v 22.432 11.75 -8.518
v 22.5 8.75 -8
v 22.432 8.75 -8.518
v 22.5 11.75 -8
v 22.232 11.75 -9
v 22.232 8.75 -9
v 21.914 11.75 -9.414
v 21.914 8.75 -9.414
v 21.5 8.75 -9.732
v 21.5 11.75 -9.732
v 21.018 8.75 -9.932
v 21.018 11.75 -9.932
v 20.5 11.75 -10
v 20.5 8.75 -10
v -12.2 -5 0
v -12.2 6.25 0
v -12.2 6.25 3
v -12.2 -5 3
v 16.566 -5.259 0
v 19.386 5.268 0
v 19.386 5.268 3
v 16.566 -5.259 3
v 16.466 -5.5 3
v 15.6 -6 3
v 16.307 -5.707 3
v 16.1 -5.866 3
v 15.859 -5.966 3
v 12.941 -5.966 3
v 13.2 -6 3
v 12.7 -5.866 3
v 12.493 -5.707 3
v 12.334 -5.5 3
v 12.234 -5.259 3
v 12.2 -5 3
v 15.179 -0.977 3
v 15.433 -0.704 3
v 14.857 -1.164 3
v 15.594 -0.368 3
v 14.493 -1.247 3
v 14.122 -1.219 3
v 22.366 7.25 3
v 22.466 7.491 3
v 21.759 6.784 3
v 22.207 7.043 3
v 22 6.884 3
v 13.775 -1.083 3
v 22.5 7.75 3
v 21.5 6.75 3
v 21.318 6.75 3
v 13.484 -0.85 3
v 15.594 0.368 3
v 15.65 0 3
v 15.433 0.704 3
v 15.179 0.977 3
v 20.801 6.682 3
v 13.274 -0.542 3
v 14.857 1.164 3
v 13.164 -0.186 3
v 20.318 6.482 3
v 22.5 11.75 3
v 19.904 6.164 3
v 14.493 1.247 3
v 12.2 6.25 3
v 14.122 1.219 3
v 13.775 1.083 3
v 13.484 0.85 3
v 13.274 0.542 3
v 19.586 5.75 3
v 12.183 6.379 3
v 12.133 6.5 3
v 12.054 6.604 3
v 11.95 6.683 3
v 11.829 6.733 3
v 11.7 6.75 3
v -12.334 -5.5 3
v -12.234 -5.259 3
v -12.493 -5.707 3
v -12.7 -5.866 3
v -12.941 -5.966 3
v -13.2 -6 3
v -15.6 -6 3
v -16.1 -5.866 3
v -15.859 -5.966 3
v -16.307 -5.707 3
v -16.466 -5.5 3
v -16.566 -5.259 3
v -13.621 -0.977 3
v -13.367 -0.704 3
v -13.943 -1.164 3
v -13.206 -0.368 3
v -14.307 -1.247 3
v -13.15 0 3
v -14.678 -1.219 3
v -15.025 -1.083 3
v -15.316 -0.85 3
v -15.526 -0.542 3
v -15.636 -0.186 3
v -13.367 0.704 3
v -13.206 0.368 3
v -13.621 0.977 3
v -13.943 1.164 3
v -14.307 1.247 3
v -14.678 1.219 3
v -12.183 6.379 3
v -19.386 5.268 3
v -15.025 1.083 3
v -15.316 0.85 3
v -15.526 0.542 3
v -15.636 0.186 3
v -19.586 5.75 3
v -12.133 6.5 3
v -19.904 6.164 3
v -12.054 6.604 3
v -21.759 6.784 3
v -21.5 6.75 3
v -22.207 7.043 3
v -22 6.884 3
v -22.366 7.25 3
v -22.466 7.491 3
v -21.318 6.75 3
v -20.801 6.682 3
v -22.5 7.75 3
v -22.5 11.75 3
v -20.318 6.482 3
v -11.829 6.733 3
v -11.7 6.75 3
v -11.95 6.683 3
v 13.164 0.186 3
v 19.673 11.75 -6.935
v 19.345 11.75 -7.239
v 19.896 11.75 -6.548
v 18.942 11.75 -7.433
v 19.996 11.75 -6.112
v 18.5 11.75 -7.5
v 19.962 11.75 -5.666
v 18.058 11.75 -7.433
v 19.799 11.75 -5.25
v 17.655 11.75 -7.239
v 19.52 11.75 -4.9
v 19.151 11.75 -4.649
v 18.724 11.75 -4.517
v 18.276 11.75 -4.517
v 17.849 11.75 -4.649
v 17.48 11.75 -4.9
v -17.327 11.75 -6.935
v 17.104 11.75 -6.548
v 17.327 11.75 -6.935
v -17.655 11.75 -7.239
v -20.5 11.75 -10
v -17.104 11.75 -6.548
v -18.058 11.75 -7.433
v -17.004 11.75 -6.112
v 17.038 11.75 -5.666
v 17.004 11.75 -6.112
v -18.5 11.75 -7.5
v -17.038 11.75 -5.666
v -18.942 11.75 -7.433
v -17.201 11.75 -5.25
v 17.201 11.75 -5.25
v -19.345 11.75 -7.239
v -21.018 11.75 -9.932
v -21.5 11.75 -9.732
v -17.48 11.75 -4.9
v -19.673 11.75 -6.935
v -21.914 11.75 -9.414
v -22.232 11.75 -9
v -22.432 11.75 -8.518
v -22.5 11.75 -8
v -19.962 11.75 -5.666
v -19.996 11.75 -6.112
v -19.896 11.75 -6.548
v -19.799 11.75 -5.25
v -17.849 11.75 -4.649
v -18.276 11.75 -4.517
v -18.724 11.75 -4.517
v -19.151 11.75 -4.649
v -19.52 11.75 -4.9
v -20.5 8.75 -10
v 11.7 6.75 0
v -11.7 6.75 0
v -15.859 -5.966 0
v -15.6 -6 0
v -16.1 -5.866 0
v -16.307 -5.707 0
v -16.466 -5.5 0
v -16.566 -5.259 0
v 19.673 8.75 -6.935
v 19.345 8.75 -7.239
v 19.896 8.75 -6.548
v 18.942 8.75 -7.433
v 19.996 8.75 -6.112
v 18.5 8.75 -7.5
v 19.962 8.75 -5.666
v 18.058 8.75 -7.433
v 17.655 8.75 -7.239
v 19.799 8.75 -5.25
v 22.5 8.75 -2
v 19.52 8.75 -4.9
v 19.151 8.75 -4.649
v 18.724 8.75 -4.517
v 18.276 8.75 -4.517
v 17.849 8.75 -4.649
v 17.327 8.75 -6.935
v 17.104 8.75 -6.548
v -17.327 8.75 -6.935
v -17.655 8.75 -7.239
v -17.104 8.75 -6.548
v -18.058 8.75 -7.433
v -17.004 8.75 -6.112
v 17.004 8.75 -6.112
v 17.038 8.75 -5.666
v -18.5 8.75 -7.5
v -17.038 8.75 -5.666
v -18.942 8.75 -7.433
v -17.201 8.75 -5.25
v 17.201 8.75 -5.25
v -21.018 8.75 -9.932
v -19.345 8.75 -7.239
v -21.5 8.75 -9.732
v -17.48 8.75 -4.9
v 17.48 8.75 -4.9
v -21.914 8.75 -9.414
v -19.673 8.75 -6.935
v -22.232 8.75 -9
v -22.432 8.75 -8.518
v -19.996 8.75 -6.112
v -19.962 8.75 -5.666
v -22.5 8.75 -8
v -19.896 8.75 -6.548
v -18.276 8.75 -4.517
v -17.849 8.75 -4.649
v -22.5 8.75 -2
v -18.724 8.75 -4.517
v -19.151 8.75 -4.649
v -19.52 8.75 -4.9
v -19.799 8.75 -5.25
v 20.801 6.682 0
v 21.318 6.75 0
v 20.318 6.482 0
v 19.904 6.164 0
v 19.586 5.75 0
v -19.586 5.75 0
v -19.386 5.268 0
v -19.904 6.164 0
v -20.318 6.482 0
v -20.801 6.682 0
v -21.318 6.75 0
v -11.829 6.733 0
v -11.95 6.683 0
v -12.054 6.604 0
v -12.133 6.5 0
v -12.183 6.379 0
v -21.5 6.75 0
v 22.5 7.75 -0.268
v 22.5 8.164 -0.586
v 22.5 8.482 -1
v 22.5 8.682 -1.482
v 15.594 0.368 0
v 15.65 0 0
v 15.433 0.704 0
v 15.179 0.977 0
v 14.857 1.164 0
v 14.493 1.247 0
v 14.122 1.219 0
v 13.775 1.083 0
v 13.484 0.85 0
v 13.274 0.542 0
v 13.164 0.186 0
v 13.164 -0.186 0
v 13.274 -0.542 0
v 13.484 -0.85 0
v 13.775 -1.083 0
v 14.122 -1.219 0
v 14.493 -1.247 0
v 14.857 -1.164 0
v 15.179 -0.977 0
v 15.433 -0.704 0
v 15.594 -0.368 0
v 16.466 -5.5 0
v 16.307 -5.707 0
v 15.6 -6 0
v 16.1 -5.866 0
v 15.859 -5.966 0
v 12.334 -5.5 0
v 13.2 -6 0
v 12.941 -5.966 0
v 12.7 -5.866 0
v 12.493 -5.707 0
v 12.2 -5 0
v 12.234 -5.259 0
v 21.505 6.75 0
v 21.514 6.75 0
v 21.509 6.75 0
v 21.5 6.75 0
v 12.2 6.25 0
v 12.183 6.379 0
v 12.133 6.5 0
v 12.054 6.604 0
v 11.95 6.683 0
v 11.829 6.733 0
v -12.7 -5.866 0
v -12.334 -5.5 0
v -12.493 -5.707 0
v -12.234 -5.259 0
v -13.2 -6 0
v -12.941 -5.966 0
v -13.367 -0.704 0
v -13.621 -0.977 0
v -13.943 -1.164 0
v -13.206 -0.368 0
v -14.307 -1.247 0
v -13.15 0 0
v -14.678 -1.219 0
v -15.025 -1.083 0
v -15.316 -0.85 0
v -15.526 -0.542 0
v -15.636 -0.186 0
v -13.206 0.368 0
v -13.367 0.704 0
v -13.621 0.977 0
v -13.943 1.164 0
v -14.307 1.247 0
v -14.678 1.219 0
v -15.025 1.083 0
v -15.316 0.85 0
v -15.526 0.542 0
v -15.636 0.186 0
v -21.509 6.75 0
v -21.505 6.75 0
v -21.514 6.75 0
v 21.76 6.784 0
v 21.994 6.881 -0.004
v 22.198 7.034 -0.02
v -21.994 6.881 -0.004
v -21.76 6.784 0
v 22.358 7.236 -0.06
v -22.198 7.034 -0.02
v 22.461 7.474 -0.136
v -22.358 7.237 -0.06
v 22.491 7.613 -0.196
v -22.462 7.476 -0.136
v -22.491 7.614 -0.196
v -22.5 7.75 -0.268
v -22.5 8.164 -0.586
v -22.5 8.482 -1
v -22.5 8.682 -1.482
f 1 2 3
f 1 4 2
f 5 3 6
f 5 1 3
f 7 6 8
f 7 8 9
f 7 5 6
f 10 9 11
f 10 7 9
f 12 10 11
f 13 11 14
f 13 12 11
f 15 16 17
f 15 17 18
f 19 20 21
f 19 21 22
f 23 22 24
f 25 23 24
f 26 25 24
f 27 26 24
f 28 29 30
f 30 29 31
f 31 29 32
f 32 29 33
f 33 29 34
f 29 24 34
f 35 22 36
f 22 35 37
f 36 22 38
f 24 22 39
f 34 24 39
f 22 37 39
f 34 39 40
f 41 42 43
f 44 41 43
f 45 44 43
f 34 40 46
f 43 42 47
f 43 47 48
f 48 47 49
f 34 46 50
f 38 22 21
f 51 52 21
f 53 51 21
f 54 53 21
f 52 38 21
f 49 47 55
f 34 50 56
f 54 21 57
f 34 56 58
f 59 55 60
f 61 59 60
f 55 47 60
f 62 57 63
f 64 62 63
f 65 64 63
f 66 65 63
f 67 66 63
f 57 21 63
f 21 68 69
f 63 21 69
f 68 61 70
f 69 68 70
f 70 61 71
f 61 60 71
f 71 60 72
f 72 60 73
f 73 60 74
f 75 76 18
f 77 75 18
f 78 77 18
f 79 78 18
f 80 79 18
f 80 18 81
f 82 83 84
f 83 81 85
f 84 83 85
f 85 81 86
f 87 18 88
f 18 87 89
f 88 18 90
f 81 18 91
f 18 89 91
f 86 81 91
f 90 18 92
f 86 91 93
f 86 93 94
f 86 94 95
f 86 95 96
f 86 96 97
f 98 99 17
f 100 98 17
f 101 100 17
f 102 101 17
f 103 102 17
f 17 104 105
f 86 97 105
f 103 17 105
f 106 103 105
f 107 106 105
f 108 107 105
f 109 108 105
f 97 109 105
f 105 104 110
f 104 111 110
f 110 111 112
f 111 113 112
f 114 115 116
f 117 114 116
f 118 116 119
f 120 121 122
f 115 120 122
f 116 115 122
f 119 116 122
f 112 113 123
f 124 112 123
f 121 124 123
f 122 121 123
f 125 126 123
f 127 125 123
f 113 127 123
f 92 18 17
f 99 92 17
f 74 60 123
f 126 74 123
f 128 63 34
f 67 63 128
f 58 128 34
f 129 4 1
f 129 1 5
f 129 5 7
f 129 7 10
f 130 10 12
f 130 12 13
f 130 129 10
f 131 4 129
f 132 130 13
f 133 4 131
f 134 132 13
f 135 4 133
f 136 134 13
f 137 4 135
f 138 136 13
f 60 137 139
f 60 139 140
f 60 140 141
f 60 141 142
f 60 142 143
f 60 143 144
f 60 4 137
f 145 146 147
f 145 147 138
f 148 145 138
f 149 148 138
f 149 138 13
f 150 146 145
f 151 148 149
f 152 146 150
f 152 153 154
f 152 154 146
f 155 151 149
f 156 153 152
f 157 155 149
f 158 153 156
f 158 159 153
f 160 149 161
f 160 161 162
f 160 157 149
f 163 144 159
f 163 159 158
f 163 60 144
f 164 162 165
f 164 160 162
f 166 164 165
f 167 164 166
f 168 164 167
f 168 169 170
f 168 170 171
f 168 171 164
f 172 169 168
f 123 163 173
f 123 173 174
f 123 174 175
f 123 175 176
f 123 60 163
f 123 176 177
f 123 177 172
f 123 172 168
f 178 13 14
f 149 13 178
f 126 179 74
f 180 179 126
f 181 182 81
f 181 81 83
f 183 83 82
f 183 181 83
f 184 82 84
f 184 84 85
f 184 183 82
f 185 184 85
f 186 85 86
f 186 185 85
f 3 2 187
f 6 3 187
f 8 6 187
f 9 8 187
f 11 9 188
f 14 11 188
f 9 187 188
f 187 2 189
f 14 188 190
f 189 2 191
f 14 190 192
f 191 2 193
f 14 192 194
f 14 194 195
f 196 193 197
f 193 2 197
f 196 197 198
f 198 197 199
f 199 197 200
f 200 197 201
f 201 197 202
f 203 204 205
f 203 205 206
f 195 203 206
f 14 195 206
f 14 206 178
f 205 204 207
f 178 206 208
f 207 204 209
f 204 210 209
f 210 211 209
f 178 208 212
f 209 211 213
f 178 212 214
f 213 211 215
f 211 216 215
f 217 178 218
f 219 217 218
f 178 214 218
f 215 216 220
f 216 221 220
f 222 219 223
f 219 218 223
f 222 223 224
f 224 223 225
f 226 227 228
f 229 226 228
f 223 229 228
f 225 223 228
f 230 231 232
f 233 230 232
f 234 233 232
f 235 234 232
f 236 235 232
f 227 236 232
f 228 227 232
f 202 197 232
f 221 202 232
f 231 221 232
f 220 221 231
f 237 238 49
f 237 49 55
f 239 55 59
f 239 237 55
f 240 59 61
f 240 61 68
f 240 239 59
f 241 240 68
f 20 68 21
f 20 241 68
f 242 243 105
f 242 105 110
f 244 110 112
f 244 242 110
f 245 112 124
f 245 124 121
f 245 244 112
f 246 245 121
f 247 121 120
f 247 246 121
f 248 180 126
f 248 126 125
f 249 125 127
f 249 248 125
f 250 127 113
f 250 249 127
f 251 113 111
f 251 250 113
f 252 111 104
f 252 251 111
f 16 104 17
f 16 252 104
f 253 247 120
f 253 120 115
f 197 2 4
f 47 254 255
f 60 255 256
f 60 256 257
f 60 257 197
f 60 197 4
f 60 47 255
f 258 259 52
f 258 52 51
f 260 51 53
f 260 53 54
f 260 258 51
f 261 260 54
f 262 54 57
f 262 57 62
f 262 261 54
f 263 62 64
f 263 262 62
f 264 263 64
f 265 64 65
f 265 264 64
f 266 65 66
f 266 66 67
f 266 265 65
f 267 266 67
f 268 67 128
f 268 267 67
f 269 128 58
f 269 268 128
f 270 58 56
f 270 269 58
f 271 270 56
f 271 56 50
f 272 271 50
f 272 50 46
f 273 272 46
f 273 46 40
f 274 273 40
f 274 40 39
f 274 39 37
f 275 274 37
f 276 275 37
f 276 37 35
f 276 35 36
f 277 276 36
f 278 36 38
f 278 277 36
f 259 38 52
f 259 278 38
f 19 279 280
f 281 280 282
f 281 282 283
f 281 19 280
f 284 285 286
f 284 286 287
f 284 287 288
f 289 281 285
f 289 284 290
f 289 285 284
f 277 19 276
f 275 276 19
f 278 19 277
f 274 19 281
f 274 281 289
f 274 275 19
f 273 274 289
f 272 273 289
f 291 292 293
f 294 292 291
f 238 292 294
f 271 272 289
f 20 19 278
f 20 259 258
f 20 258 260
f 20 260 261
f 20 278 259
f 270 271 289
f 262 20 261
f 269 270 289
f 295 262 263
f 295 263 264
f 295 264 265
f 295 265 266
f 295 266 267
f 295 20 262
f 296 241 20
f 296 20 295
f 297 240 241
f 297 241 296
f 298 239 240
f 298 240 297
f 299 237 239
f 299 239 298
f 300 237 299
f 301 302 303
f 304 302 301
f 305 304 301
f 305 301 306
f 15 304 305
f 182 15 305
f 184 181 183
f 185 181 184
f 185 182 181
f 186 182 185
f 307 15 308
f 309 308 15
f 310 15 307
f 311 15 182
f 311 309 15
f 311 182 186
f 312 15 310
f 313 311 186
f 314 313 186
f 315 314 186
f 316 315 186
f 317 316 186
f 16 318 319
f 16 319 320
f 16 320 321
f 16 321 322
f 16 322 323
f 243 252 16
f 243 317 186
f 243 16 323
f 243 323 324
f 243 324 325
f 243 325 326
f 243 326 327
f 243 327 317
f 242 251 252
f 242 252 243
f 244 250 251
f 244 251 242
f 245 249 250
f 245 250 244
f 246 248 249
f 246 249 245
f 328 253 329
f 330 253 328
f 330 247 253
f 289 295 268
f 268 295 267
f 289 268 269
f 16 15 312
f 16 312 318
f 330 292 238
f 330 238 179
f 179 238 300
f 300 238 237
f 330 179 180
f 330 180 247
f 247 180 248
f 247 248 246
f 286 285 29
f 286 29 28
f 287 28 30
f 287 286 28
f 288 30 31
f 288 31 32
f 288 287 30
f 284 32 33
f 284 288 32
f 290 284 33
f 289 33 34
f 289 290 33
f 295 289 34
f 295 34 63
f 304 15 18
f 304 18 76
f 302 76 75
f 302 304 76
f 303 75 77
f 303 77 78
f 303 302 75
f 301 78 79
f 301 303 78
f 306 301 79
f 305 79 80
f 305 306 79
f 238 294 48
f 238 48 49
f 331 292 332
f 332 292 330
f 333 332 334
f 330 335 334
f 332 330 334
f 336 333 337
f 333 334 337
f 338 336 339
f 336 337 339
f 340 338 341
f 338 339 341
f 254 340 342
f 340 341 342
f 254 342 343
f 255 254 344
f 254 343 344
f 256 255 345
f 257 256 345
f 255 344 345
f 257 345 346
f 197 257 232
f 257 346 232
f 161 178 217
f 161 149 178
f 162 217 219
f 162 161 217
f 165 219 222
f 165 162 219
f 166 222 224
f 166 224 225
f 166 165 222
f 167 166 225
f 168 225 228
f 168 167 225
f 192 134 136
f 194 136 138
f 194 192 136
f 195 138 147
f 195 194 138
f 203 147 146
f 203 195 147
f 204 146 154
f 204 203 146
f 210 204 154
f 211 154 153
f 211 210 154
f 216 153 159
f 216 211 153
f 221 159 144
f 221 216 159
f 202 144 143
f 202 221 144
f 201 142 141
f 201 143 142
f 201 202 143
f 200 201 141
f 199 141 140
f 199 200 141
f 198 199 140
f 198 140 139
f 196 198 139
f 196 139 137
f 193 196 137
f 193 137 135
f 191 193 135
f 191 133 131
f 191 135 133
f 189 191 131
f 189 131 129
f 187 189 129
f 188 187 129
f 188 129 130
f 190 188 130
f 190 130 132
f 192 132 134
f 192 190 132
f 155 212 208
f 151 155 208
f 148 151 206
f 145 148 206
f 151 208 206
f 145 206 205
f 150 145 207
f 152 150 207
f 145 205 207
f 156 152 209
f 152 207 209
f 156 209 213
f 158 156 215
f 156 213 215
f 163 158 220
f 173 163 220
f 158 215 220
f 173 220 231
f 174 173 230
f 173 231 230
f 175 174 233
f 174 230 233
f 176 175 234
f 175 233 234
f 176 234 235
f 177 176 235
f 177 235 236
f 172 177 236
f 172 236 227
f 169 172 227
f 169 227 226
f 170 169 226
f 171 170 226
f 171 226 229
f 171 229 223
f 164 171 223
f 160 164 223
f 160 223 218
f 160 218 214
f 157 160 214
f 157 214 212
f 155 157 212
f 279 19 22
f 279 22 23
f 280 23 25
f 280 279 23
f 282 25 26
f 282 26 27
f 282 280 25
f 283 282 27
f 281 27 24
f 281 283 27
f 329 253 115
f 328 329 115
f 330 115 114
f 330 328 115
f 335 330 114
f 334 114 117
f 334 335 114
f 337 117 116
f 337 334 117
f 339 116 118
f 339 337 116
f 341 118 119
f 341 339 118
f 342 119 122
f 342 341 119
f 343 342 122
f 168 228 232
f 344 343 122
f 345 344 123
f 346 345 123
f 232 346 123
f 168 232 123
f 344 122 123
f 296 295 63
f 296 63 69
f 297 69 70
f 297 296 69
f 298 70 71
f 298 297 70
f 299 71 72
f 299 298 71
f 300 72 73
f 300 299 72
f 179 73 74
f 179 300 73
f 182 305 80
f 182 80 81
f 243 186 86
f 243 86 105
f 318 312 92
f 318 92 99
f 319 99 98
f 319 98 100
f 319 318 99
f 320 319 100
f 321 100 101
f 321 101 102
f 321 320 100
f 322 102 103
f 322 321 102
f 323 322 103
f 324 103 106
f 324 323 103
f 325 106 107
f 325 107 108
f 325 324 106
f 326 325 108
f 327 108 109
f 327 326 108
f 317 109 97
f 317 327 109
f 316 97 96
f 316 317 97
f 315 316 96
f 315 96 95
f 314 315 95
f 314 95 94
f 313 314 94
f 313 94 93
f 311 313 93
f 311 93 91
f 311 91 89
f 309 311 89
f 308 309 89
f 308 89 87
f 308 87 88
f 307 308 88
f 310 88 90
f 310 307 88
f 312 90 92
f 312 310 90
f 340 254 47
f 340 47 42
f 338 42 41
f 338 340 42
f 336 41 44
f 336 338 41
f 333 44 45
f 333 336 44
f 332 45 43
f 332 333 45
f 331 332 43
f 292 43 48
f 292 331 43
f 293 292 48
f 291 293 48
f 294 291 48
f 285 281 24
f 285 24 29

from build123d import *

# Parameters (mm, degrees)
SKETCH3_R           = 1.25
BOSS_EXTRUDE1_DEPTH = 3
SKETCH4_W           = 45
SKETCH4_H           = 3
BOSS_EXTRUDE2_DEPTH = 10
FILLET1_R           = 2
FILLET2_R           = 2
SKETCH5_R           = 1.5
CUT_EXTRUDE1_DEPTH  = 29.702134145


with BuildPart() as part:
    # Sketch3 → Boss-Extrude1 (new body)
    with BuildSketch(Plane.XY):
        with BuildLine():
            Line((-12.2, 6.25), (-12.2, -5))
            ThreePointArc((-12.2, -5), (-12.492893219, -5.707106781), (-13.2, -6))
            Line((-13.2, -6), (-15.6, -6))
            ThreePointArc((-15.6, -6), (-16.208761429, -5.79335334), (-16.565925826, -5.258819045))
            Line((-16.565925826, -5.258819045), (-19.386481515, 5.26763809))
            ThreePointArc((-19.386481515, 5.26763809), (-20.100810309, 6.336706681), (-21.318333167, 6.75))
            Line((-21.318333167, 6.75), (-21.5, 6.75))
            ThreePointArc((-21.5, 6.75), (-22.207106781, 7.042893219), (-22.5, 7.75))
            Line((-22.5, 7.75), (-22.5, 11.75))
            Line((-22.5, 11.75), (22.5, 11.75))
            Line((22.5, 11.75), (22.5, 7.75))
            ThreePointArc((22.5, 7.75), (22.207106781, 7.042893219), (21.5, 6.75))
            Line((21.5, 6.75), (21.318333167, 6.75))
            ThreePointArc((21.318333167, 6.75), (20.100810309, 6.336706681), (19.386481515, 5.26763809))
            Line((19.386481515, 5.26763809), (16.565925826, -5.258819045))
            ThreePointArc((16.565925826, -5.258819045), (16.208761429, -5.79335334), (15.6, -6))
            Line((15.6, -6), (13.2, -6))
            ThreePointArc((13.2, -6), (12.492893219, -5.707106781), (12.2, -5))
            Line((12.2, -5), (12.2, 6.25))
            ThreePointArc((12.2, 6.25), (12.053553391, 6.603553391), (11.7, 6.75))
            Line((11.7, 6.75), (-11.7, 6.75))
            ThreePointArc((-11.7, 6.75), (-12.053553391, 6.603553391), (-12.2, 6.25))
        make_face()
        with Locations((-14.4, 0)):
            Circle(SKETCH3_R, mode=Mode.SUBTRACT)
        with Locations((14.4, 0)):
            Circle(SKETCH3_R, mode=Mode.SUBTRACT)
    extrude(amount=BOSS_EXTRUDE1_DEPTH)

    # Sketch4 → Boss-Extrude2 (add)
    with BuildSketch(Plane(origin=(0, 0, 0), x_dir=(-1, 0, 0), z_dir=(0, 0, -1))):
        with Locations((0, 10.25)):
            Rectangle(SKETCH4_W, SKETCH4_H)
    extrude(amount=BOSS_EXTRUDE2_DEPTH)

    # Fillet1
    fillet1_edges = [part.edges().sort_by_distance(p)[0] for p in [
        (0, 8.75, 0),
    ]]
    fillet(fillet1_edges, radius=FILLET1_R - 0.0001)  # a hair under: the kernel refuses the full size

    # Fillet2
    fillet2_edges = [part.edges().sort_by_distance(p)[0] for p in [
        (22.5, 10.25, -10),
        (-22.5, 10.25, -10),
    ]]
    fillet(fillet2_edges, radius=FILLET2_R)

    # Sketch5 → Cut-Extrude1 (cut, through all)
    with BuildSketch(Plane.XZ.offset(-8.75)):
        with Locations(Location((-18.5, -6, 0), (0, 0, 270))):
            Circle(SKETCH5_R)
    cut_extrude1 = extrude(amount=-CUT_EXTRUDE1_DEPTH, mode=Mode.SUBTRACT)

    # Mirror1: Cut-Extrude1 across plane
    add(cut_extrude1.mirror(Plane(origin=(0, 0, 0), x_dir=(0, 0, 1), z_dir=(1, 0, 0))), mode=Mode.SUBTRACT)


solid = part.part
